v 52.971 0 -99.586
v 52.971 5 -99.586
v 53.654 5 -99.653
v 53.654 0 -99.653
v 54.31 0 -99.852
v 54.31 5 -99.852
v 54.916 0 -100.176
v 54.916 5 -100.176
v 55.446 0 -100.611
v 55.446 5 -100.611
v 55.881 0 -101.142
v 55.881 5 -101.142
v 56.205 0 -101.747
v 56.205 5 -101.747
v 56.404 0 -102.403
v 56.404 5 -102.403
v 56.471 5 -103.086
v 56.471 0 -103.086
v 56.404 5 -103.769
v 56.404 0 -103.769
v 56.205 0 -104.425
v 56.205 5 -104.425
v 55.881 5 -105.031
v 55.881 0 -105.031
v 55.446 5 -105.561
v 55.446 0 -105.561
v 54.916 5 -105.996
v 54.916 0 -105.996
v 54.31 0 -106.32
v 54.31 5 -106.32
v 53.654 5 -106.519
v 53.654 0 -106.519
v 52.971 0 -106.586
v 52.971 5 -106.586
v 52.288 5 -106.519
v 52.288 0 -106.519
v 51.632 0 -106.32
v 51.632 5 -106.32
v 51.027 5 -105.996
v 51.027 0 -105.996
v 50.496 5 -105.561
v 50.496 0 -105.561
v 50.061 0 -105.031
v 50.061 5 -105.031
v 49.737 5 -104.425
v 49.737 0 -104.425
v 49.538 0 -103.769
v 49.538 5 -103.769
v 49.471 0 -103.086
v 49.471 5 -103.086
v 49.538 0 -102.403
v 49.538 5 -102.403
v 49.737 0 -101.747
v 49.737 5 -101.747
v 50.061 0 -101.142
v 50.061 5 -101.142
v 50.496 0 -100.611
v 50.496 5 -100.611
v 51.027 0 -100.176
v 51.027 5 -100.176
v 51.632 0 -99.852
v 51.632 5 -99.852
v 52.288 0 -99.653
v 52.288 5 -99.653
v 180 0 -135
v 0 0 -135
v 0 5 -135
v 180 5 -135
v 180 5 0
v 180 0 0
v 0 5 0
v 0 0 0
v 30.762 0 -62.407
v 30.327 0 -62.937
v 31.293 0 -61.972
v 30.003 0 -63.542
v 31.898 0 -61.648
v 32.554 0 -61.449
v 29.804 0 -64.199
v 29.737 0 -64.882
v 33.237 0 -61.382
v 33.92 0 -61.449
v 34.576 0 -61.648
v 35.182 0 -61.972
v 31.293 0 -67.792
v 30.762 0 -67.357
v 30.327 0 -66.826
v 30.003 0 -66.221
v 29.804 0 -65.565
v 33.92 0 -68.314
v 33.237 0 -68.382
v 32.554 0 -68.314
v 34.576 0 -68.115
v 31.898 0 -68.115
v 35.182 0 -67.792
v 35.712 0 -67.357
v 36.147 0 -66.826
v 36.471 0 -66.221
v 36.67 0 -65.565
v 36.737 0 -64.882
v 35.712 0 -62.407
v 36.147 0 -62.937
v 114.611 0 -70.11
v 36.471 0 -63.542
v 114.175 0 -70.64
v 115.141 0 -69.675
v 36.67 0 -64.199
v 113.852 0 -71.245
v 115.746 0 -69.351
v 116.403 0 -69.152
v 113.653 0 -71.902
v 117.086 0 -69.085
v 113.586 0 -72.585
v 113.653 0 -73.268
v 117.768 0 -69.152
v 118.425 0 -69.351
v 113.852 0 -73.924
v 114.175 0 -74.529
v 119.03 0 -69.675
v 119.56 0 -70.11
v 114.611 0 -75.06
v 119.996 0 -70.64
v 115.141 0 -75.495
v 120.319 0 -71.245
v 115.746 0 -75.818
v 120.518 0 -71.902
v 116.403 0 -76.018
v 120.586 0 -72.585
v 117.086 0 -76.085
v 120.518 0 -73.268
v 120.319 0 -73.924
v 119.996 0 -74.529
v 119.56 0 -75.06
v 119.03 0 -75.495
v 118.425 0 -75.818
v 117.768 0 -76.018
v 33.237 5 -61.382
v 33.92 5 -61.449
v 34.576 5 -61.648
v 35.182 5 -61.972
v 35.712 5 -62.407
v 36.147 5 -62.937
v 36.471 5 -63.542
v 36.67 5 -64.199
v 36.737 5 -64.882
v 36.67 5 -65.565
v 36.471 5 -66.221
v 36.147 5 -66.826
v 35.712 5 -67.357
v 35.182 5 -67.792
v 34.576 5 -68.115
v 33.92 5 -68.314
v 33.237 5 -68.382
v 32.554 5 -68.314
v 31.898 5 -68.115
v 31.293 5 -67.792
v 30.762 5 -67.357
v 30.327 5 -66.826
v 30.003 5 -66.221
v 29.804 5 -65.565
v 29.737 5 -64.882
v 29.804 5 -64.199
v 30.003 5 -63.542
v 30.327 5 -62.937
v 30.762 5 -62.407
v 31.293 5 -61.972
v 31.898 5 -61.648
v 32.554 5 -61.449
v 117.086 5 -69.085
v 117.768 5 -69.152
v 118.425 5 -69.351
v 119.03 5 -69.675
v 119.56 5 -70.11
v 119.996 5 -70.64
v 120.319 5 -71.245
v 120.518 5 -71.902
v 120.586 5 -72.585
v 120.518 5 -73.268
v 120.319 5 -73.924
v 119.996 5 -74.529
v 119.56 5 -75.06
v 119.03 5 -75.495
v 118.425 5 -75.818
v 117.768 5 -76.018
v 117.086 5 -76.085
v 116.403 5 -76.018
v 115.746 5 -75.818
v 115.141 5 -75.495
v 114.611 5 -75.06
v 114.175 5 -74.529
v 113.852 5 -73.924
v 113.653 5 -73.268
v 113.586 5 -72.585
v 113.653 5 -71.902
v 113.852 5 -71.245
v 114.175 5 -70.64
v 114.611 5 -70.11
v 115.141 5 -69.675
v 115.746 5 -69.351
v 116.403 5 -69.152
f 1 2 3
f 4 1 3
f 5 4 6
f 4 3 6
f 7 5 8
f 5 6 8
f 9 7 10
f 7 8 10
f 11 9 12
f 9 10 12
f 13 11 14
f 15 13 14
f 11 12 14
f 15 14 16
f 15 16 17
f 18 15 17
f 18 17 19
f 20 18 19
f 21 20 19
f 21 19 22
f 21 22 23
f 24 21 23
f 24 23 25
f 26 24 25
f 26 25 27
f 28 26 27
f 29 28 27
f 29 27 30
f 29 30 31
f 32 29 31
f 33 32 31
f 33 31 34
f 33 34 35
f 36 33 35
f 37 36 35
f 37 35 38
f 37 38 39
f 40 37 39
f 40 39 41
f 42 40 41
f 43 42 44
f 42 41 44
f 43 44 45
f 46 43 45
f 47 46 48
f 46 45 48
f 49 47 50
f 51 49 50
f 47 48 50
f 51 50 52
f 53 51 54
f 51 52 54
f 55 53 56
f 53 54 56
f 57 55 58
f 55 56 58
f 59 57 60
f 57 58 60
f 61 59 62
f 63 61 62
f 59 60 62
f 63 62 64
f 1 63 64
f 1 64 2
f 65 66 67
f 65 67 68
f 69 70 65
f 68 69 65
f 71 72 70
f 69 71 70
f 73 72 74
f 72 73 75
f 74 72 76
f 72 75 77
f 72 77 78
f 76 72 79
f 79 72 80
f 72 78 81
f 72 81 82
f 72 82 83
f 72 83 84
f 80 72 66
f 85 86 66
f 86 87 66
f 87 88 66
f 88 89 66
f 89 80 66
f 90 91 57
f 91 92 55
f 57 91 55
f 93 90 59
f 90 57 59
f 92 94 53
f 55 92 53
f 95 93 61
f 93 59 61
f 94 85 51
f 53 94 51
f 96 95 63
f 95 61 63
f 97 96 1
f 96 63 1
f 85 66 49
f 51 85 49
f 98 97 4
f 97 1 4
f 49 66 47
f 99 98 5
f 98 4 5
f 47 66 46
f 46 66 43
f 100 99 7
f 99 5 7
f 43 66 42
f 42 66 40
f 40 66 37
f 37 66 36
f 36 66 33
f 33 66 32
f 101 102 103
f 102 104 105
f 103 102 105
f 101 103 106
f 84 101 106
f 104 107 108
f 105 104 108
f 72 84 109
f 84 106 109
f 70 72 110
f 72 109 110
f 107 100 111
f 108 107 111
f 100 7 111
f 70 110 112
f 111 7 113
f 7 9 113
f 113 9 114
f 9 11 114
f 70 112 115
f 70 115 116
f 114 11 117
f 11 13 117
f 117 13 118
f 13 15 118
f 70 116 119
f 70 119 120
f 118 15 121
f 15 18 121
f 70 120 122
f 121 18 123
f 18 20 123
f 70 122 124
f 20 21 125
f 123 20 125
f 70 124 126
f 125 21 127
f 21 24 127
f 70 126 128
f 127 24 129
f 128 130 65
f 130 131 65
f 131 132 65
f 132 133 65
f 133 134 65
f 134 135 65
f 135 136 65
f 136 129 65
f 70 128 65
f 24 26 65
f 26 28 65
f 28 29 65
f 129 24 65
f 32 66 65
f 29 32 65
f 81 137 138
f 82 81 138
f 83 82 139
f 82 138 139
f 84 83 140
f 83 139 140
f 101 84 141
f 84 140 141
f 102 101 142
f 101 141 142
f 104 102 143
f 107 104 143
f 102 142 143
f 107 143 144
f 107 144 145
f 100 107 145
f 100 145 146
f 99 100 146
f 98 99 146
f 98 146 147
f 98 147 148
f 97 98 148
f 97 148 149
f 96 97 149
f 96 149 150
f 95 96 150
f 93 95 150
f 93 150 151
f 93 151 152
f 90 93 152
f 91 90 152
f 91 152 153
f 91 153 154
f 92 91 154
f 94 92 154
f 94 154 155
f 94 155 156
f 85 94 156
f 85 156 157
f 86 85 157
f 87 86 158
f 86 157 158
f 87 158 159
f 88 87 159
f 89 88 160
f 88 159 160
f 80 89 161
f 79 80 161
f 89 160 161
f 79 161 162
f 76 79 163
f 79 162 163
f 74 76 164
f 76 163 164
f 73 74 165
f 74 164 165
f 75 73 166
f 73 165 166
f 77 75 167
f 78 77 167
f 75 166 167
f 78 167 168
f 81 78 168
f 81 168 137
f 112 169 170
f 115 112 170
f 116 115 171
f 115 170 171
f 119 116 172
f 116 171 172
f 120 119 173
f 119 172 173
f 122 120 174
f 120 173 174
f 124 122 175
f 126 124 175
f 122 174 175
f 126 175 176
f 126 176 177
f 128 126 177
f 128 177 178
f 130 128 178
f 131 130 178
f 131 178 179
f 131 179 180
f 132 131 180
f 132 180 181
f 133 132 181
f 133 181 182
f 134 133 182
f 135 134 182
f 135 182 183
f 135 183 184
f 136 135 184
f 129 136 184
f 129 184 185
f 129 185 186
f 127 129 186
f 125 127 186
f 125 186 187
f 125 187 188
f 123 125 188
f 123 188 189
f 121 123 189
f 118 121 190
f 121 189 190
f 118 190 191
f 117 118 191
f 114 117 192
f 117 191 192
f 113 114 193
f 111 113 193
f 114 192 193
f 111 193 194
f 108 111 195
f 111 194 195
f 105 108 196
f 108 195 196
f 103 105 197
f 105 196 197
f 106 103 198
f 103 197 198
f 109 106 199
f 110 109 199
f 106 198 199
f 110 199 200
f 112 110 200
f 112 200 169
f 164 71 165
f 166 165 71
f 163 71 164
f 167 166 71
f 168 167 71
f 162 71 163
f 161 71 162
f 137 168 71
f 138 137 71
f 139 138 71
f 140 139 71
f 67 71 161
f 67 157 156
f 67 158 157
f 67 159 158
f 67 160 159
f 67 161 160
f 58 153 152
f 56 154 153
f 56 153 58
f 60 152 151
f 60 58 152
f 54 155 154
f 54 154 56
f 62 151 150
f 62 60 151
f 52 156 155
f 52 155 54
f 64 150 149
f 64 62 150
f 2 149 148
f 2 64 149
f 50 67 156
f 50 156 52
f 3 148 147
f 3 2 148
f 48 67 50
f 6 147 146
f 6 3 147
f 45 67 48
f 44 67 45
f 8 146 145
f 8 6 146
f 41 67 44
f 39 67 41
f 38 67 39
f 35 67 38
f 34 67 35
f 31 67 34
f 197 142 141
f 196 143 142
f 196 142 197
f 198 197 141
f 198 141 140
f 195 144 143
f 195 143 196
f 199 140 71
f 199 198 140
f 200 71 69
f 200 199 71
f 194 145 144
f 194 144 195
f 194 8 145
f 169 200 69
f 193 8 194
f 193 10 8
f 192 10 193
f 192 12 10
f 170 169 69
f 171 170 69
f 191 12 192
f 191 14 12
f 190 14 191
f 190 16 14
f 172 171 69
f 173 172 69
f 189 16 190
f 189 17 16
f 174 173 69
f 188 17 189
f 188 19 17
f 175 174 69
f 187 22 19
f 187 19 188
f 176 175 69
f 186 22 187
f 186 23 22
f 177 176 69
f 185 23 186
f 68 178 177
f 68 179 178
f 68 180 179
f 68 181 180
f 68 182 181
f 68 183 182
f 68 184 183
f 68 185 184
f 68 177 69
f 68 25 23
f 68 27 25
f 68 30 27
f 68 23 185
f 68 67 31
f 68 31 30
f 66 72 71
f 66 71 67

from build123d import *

# Parameters (mm, degrees)
SKETCH1_W           = 180
SKETCH1_H           = 135
BOSS_EXTRUDE1_DEPTH = 5
SKETCH5_OUTSIDE_W   = 227.012
SKETCH5_OUTSIDE_H   = 182.012
SKETCH5_OUTSIDE_W_2 = 180
SKETCH5_OUTSIDE_H_2 = 135
SKETCH5_OUTSIDE_R   = 3.5
CUT_EXTRUDE2_DEPTH  = 226.055548699


with BuildPart() as part:
    # Sketch1 → Boss-Extrude1 (new body)
    with BuildSketch(Plane(origin=(0, 0, 0), x_dir=(1, 0, 0), z_dir=(0, 1, 0))):
        with Locations((90, 67.5)):
            Rectangle(SKETCH1_W, SKETCH1_H)
    extrude(amount=BOSS_EXTRUDE1_DEPTH)

    # Sketch5 outside → Cut-Extrude2 (cut, through all)
    # profile 1 of 4: a face of its own
    with BuildSketch(Plane(origin=(0, 5, 0), x_dir=(1, 0, 0), z_dir=(0, 1, 0))):
        with Locations((90, 67.5)):
            Rectangle(SKETCH5_OUTSIDE_W, SKETCH5_OUTSIDE_H)
        with Locations((90, 67.5)):
            Rectangle(SKETCH5_OUTSIDE_W_2, SKETCH5_OUTSIDE_H_2, mode=Mode.SUBTRACT)
    # profile 2 of 4: a face of its own
    with BuildSketch(Plane(origin=(0, 5, 0), x_dir=(1, 0, 0), z_dir=(0, 1, 0))):
        with Locations(Location((52.971072195, 103.086051909, 0), (0, 0, 270))):
            Circle(SKETCH5_OUTSIDE_R)
    # profile 3 of 4: a face of its own
    with BuildSketch(Plane(origin=(0, 5, 0), x_dir=(1, 0, 0), z_dir=(0, 1, 0))):
        with Locations(Location((117.085590552, 72.584764462, 0), (0, 0, 270))):
            Circle(SKETCH5_OUTSIDE_R)
    # profile 4 of 4: a face of its own
    with BuildSketch(Plane(origin=(0, 5, 0), x_dir=(1, 0, 0), z_dir=(0, 1, 0))):
        with Locations(Location((33.237075338, 64.881741052, 0), (0, 0, 270))):
            Circle(SKETCH5_OUTSIDE_R)
    extrude(amount=-CUT_EXTRUDE2_DEPTH, mode=Mode.SUBTRACT)


solid = part.part
